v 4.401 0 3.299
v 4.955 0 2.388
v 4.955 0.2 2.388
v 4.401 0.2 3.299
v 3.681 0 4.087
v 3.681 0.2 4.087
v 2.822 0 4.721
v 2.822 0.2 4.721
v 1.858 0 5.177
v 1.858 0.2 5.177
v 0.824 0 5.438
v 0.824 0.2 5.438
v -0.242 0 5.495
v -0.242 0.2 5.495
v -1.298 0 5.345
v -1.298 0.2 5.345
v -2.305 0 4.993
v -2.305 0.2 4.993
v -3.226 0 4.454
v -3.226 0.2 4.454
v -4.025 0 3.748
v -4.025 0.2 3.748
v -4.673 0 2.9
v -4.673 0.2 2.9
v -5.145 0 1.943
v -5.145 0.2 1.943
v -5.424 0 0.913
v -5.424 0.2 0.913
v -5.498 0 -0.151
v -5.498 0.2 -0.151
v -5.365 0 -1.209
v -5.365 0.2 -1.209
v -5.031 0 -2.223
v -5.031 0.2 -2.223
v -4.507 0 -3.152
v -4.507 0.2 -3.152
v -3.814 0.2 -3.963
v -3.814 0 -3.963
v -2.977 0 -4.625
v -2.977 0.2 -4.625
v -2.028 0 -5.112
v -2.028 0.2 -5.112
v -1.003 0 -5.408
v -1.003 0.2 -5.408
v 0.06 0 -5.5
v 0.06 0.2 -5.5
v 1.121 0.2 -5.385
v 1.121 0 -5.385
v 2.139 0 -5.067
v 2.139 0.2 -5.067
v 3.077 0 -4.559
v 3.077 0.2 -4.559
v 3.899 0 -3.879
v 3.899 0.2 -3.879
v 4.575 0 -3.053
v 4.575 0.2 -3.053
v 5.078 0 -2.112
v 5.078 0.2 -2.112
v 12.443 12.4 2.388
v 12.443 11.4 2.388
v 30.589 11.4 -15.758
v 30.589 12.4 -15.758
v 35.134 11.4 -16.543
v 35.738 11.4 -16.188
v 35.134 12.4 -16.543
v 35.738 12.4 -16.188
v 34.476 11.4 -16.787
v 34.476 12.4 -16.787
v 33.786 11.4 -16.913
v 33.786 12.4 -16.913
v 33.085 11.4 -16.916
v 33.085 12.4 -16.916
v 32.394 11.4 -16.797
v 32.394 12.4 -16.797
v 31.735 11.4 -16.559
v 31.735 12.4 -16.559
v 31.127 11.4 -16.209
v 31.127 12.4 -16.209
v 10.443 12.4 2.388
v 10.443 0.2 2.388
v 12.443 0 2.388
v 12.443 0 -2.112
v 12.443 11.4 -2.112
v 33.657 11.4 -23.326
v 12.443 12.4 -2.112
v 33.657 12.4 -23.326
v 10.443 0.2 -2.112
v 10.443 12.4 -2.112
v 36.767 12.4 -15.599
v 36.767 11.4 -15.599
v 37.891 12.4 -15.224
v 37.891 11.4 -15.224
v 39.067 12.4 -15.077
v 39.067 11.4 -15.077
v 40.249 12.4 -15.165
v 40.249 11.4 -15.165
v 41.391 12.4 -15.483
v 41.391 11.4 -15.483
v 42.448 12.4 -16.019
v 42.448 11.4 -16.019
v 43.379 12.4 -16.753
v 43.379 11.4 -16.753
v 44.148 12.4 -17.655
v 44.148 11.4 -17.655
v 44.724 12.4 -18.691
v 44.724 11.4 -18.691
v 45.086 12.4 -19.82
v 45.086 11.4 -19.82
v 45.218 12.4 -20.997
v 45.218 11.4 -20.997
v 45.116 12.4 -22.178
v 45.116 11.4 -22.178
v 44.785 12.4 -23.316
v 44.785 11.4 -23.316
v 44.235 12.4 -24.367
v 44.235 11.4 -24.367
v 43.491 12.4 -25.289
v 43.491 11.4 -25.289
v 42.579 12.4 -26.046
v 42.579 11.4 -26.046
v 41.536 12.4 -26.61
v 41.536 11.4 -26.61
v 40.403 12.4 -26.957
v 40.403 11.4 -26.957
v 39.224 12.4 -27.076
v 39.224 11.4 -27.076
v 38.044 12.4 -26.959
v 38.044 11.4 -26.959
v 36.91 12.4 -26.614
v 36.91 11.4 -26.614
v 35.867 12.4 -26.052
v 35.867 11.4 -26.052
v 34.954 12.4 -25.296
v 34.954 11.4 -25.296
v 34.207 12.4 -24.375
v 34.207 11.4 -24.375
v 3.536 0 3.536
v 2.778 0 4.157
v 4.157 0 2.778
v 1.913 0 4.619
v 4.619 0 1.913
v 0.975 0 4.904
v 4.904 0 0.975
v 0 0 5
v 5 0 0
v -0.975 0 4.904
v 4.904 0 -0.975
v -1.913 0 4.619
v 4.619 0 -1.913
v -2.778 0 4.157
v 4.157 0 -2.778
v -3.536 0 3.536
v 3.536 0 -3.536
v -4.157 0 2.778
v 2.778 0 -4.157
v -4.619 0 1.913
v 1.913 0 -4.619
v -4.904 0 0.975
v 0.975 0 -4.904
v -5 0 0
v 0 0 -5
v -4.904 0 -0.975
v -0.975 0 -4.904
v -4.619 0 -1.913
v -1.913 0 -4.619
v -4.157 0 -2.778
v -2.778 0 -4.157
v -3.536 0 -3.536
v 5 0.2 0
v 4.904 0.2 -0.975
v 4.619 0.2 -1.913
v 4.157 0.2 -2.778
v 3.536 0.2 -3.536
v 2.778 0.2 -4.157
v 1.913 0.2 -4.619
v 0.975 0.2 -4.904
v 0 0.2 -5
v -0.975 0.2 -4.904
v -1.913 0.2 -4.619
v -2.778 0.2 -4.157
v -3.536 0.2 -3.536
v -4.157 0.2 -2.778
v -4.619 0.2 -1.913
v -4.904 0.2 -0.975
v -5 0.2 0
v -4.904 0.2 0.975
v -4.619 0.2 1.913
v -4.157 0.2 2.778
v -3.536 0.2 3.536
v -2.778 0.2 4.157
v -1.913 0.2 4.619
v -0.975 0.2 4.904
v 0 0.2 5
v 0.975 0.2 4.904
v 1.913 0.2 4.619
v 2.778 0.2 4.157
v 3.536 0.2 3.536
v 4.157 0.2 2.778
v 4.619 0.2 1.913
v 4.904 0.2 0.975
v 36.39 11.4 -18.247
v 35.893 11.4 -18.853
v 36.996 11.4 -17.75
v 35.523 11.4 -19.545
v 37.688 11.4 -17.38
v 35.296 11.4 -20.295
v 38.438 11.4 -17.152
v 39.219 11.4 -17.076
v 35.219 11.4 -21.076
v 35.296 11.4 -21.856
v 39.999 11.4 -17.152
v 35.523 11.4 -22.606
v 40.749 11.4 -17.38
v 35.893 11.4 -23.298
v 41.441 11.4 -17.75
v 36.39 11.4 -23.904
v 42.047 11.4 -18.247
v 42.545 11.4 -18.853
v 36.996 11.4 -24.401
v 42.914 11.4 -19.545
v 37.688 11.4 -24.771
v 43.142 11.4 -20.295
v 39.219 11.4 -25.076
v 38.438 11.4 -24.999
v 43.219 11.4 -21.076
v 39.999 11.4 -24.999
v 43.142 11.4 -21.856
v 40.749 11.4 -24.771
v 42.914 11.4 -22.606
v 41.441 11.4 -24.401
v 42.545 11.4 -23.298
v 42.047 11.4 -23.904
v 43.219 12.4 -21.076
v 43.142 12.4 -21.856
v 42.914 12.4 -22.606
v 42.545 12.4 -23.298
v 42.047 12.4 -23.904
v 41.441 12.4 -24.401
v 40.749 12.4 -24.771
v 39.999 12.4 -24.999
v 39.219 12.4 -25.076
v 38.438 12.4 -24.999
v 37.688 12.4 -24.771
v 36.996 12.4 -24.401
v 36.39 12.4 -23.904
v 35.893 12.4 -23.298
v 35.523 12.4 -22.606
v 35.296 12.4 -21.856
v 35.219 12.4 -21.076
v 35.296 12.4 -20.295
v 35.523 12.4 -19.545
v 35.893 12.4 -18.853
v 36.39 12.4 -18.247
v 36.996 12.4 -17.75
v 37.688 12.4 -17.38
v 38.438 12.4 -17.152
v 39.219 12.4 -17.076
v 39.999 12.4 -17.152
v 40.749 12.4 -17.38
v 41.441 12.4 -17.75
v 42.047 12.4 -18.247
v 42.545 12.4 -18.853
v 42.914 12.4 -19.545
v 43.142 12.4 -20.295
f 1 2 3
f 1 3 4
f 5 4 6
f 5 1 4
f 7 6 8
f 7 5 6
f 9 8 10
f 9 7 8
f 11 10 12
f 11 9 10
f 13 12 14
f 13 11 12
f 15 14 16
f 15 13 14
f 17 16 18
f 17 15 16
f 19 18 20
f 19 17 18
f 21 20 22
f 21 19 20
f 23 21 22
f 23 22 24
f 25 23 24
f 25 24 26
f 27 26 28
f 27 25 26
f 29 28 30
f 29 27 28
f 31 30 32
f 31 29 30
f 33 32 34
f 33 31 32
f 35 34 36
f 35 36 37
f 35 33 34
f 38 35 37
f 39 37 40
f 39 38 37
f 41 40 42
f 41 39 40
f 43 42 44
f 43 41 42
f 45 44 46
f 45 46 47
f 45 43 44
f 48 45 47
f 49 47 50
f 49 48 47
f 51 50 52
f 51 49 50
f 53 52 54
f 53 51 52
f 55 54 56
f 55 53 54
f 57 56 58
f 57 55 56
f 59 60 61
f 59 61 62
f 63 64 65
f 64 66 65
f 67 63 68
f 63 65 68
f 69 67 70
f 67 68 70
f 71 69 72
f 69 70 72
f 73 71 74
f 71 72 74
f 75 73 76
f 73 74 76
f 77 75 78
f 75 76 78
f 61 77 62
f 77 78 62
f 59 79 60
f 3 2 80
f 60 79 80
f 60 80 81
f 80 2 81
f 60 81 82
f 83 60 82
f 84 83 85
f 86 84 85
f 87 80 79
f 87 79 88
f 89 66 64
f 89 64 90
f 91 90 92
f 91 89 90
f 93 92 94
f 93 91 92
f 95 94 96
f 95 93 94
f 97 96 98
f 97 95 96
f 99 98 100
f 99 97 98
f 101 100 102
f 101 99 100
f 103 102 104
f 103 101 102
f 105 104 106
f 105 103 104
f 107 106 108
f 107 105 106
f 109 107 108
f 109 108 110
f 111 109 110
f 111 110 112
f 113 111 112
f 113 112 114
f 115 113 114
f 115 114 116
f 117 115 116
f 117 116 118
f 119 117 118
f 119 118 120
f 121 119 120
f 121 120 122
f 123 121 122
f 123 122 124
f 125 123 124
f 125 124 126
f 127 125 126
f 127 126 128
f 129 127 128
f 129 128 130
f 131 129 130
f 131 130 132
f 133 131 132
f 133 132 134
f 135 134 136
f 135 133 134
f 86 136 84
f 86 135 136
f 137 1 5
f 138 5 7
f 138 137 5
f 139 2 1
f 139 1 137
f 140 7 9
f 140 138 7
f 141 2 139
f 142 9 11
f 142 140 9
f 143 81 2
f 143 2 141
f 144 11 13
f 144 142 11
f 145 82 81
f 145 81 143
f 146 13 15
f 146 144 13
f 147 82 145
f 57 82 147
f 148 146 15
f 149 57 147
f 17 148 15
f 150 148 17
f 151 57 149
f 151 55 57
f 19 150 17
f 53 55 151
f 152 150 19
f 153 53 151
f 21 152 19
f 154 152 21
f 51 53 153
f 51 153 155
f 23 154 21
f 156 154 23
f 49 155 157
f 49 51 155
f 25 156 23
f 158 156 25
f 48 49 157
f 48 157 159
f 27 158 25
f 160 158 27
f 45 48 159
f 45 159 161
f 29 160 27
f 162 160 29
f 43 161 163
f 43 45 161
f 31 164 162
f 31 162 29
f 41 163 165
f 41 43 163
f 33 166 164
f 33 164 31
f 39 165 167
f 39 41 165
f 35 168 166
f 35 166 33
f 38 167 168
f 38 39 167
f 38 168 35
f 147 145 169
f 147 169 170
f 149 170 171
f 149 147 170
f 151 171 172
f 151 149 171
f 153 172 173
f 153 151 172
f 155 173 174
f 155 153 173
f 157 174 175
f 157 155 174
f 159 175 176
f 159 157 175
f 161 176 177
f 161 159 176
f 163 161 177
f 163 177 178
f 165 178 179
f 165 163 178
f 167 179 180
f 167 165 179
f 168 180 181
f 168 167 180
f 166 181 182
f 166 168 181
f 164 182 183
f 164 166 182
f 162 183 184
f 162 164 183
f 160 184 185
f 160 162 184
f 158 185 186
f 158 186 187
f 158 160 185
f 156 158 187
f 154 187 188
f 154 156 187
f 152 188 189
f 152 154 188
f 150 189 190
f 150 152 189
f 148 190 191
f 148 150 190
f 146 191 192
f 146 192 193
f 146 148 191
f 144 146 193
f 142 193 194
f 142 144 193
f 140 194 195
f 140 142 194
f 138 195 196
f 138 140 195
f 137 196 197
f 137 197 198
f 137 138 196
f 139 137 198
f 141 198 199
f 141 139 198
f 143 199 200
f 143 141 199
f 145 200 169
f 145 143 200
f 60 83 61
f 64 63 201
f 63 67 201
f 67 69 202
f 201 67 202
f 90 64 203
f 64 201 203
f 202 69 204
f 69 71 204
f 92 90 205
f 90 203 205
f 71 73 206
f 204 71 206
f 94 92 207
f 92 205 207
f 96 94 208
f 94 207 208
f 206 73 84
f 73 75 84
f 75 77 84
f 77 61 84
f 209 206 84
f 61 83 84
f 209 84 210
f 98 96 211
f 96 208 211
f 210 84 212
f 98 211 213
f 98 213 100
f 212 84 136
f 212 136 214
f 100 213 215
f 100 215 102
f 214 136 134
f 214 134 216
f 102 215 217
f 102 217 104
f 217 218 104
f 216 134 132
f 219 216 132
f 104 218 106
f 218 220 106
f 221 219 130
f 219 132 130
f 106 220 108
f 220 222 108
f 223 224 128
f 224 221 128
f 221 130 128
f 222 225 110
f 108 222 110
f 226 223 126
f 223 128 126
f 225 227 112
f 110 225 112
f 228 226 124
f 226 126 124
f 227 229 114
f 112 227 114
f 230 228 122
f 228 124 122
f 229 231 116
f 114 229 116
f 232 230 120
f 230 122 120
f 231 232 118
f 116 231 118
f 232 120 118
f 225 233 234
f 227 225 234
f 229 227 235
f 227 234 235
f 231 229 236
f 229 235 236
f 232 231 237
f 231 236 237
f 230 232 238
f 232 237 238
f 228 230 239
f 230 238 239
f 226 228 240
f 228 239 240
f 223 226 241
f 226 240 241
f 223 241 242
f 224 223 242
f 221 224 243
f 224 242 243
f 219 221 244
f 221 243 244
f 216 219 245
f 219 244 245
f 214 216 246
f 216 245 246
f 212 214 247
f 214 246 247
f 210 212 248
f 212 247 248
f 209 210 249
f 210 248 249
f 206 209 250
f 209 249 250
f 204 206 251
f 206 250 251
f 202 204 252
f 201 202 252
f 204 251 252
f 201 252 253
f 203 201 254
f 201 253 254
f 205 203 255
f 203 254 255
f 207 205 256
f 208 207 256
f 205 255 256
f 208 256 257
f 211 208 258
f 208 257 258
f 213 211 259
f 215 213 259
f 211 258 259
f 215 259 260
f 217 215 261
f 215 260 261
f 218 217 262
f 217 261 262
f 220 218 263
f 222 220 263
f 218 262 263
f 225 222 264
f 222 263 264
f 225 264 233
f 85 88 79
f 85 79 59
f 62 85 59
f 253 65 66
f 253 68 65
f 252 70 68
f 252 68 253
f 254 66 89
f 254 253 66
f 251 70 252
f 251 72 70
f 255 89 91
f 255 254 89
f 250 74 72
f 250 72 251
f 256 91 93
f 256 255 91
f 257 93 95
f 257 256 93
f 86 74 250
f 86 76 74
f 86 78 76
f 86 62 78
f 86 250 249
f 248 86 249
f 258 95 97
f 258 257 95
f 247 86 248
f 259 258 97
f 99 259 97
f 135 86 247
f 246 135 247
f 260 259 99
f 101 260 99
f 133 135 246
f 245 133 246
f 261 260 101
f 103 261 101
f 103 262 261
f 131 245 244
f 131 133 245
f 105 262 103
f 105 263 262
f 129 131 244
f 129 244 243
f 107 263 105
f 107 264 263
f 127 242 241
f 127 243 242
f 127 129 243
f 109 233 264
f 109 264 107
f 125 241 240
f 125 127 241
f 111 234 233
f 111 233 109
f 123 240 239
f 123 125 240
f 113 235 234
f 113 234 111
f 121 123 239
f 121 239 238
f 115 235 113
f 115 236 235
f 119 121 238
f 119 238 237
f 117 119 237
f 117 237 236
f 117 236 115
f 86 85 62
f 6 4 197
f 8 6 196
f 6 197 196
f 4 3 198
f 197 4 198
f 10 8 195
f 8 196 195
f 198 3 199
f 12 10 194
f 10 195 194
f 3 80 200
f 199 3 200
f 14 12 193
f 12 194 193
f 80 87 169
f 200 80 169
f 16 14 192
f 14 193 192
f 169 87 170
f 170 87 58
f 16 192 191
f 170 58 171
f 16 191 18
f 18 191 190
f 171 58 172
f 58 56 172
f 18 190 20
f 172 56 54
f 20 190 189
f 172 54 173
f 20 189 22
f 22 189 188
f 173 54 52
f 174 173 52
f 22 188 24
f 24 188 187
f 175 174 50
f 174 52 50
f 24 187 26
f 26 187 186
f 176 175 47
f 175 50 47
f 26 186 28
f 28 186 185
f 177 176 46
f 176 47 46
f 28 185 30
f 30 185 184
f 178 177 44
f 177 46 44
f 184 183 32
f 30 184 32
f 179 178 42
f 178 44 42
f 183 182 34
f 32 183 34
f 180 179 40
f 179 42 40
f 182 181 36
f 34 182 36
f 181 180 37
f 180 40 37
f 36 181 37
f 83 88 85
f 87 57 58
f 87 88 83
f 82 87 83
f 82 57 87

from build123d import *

# Parameters (mm, degrees)
CROQUIS1_R              = 5
SALIENTE_EXTRUIR2_DEPTH = 0.2
CROQUIS2_W              = 2
CROQUIS2_H              = 4.5
SALIENTE_EXTRUIR3_DEPTH = 12.2
CROQUIS7_W              = 4.5
CROQUIS7_H              = 1
SALIENTE_EXTRUIR6_DEPTH = 30
CROQUIS9_R              = 4
SALIENTE_EXTRUIR7_DEPTH = 1
REDONDEO1_R             = 4


with BuildPart() as part:
    # Croquis1 → Saliente-Extruir2 (new body)
    with BuildSketch(Plane(origin=(0, 0, 0), x_dir=(1, 0, 0), z_dir=(0, 1, 0))):
        with BuildLine():
            Line((5.078188303, 2.112345511), (12.443307855, 2.112345511))
            Line((12.443307855, 2.112345511), (12.443307855, -2.387654489))
            Line((12.443307855, -2.387654489), (4.954705444, -2.387654489))
            ThreePointArc((4.954705444, -2.387654489), (-5.49793045, 0.150866705), (5.078188303, 2.112345511))
        make_face()
        Circle(CROQUIS1_R, mode=Mode.SUBTRACT)
    extrude(amount=SALIENTE_EXTRUIR2_DEPTH)

    # Croquis2 → Saliente-Extruir3 (add)
    with BuildSketch(Plane(origin=(0, 0.2, 0), x_dir=(1, 0, 0), z_dir=(0, 1, 0))):
        with Locations((11.443307855, -0.137654489)):
            Rectangle(CROQUIS2_W, CROQUIS2_H)
    extrude(amount=SALIENTE_EXTRUIR3_DEPTH)

    # Croquis7 → Saliente-Extruir6 (add, along a direction that is not the sketch's normal)
    with BuildSketch(Plane(origin=(12.443307855, 0, 0), x_dir=(0, 0, -1), z_dir=(1, 0, 0))):
        with Locations((-0.137654489, 11.9)):
            Rectangle(CROQUIS7_W, CROQUIS7_H)
    extrude(amount=SALIENTE_EXTRUIR6_DEPTH, dir=(0.707106781, 0, -0.707106781))

    # Croquis9 → Saliente-Extruir7 (add)
    with BuildSketch(Plane(origin=(0, 12.4, 0), x_dir=(1, 0, 0), z_dir=(0, 1, 0))):
        with BuildLine():
            Line((33.656511291, 23.325548946), (33.656511291, 18.825548946))
            ThreePointArc((33.656511291, 18.825548946), (45.218660156, 21.075548946), (33.656511291, 23.325548946))
        make_face()
        with Locations((39.218660156, 21.075548946)):
            Circle(CROQUIS9_R, mode=Mode.SUBTRACT)
    extrude(amount=-SALIENTE_EXTRUIR7_DEPTH)

    # Redondeo1
    redondeo1_edges = [part.edges().sort_by_distance(p)[0] for p in [
        (33.656511291, 11.9, -18.825548946),
    ]]
    fillet(redondeo1_edges, radius=REDONDEO1_R)


solid = part.part
